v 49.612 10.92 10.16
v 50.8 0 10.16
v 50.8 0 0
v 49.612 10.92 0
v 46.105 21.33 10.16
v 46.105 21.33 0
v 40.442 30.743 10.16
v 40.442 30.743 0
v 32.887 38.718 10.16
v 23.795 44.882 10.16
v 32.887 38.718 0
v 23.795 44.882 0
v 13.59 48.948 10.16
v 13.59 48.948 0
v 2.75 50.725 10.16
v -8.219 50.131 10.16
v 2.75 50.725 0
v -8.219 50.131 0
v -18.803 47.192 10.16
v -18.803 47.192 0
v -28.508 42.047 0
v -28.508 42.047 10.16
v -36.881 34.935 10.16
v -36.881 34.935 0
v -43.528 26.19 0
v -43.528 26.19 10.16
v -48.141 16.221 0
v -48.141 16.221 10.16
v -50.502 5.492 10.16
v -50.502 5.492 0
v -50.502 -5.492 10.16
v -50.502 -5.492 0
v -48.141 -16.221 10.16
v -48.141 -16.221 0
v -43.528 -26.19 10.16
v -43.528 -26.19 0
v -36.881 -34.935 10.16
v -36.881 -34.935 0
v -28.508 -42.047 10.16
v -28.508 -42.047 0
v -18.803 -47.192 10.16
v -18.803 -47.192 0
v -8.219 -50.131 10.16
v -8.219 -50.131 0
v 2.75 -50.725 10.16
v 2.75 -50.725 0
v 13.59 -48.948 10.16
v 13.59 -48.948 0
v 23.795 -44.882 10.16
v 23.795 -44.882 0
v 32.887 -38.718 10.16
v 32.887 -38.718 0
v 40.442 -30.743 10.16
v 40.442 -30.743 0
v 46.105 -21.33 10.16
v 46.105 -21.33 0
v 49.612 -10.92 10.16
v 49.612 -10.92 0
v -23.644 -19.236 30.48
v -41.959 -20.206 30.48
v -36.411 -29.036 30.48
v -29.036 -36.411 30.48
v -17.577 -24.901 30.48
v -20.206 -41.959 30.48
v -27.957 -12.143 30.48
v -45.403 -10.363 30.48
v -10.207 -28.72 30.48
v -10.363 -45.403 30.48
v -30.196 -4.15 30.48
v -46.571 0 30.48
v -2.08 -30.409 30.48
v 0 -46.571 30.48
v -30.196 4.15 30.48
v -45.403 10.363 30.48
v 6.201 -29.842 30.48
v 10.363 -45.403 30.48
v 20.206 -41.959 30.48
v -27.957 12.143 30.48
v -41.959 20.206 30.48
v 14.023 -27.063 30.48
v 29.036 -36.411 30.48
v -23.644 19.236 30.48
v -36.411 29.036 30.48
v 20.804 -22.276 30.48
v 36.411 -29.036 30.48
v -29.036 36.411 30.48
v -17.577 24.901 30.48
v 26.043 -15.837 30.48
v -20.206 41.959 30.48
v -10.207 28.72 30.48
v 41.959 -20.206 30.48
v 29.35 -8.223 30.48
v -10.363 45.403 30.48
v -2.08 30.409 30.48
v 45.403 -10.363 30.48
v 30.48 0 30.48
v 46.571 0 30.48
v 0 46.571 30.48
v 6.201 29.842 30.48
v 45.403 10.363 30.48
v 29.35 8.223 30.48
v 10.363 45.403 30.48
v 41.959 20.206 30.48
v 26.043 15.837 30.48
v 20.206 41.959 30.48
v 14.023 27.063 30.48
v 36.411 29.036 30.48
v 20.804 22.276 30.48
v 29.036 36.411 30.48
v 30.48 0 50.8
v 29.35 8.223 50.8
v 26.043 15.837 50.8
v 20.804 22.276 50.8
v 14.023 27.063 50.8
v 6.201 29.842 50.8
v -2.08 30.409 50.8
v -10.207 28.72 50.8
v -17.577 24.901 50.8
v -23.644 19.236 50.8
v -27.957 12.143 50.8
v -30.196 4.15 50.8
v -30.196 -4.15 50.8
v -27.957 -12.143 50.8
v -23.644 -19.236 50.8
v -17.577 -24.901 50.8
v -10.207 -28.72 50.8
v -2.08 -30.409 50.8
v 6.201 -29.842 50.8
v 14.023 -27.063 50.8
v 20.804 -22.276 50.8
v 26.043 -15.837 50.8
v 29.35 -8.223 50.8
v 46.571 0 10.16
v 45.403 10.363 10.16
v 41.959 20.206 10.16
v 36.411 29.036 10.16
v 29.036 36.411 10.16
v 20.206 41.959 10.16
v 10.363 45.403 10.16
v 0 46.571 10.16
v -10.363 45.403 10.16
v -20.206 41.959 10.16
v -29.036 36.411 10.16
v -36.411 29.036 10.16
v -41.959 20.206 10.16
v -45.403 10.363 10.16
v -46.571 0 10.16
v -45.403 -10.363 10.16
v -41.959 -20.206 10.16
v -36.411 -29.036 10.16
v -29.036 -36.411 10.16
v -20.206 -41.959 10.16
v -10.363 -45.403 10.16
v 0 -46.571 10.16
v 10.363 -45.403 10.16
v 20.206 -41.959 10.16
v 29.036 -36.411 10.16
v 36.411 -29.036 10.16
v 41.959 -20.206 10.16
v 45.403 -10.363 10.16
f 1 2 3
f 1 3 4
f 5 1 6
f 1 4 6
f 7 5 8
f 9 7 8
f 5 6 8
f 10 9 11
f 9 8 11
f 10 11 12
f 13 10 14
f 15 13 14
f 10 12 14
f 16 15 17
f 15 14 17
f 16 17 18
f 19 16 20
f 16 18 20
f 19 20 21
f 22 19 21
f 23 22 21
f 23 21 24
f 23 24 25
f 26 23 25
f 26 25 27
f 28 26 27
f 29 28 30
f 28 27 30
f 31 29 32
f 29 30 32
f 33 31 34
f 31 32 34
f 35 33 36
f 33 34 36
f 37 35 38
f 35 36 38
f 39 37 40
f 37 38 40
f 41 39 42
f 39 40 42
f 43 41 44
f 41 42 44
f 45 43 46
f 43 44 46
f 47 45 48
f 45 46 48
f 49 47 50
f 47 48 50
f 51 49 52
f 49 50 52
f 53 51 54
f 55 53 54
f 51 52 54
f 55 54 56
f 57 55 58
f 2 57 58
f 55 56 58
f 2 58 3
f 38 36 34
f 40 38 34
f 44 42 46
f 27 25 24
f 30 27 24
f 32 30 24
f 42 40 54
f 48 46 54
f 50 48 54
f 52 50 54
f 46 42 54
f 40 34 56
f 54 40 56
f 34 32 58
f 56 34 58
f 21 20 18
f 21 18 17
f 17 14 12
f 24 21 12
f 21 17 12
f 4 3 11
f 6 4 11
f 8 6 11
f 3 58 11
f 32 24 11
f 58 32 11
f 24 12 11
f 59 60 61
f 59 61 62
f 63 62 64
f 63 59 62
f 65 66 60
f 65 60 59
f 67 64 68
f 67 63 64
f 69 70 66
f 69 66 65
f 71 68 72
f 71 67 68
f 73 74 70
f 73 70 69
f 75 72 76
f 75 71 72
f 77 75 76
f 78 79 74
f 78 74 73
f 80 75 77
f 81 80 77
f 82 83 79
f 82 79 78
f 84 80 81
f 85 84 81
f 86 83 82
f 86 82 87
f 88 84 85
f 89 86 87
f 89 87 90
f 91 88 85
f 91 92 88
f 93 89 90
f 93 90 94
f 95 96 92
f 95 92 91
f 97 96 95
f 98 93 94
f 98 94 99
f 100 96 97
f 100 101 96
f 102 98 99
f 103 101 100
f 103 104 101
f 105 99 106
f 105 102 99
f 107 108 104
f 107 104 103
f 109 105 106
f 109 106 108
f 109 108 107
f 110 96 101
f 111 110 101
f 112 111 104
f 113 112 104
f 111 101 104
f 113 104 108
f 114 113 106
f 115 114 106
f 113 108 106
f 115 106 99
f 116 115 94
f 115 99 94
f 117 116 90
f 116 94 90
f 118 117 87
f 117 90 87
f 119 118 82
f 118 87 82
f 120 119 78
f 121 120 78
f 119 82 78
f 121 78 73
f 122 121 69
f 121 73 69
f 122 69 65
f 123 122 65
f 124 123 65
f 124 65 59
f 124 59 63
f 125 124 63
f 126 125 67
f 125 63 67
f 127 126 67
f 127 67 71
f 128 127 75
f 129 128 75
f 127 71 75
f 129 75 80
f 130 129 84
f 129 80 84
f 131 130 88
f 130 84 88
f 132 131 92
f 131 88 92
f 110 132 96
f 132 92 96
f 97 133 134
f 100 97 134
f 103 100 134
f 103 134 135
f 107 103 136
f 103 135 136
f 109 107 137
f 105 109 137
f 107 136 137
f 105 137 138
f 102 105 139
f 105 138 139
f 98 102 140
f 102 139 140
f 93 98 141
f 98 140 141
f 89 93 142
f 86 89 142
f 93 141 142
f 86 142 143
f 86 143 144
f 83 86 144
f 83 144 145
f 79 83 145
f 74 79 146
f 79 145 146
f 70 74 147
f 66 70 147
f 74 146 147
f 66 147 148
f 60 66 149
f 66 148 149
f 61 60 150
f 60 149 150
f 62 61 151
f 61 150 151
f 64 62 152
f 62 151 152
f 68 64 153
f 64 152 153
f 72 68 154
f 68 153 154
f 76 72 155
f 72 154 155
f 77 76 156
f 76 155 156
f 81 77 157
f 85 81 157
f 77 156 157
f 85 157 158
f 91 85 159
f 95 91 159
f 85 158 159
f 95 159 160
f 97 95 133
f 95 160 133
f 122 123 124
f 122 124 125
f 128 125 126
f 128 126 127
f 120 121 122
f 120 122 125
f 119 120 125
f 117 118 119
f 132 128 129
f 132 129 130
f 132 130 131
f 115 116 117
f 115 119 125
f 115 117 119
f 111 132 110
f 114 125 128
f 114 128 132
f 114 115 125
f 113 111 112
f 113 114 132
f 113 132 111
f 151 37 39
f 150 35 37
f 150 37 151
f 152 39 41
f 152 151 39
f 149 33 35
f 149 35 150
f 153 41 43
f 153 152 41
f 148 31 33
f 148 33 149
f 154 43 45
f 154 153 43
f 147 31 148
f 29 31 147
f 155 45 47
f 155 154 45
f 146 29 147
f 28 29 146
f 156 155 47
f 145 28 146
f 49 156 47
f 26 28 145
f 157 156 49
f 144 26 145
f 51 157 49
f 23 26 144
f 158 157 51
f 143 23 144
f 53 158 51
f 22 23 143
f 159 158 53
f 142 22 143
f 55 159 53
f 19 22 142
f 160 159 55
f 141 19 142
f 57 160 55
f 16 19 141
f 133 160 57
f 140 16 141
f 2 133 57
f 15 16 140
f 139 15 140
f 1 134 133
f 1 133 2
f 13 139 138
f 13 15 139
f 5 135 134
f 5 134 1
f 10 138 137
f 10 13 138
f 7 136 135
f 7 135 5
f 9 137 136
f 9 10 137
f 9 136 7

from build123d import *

# Parameters (mm, degrees)
F0_R     = 50.8
F1_DEPTH = 10.16
F2_R     = 46.5709
F3_DEPTH = 20.32
F4_R     = 30.48
F5_DEPTH = 20.32


# Not quite as in the source:
# - a feature names something its author has since deleted; it is built from what else it names


with BuildPart() as f1:
    # F0 (on Top) → F1 (new body)
    with BuildSketch(Plane.XY):
        Circle(F0_R)
    extrude(amount=F1_DEPTH)

    # F2 (on face) → F3 (join)
    with BuildSketch(Plane.XY.offset(10.16)):
        Circle(F2_R)
    extrude(amount=F3_DEPTH)

    # F4 (on face) → F5 (join)
    with BuildSketch(Plane.XY.offset(30.48)):
        Circle(F4_R)
    extrude(amount=F5_DEPTH)


solid = f1.part
